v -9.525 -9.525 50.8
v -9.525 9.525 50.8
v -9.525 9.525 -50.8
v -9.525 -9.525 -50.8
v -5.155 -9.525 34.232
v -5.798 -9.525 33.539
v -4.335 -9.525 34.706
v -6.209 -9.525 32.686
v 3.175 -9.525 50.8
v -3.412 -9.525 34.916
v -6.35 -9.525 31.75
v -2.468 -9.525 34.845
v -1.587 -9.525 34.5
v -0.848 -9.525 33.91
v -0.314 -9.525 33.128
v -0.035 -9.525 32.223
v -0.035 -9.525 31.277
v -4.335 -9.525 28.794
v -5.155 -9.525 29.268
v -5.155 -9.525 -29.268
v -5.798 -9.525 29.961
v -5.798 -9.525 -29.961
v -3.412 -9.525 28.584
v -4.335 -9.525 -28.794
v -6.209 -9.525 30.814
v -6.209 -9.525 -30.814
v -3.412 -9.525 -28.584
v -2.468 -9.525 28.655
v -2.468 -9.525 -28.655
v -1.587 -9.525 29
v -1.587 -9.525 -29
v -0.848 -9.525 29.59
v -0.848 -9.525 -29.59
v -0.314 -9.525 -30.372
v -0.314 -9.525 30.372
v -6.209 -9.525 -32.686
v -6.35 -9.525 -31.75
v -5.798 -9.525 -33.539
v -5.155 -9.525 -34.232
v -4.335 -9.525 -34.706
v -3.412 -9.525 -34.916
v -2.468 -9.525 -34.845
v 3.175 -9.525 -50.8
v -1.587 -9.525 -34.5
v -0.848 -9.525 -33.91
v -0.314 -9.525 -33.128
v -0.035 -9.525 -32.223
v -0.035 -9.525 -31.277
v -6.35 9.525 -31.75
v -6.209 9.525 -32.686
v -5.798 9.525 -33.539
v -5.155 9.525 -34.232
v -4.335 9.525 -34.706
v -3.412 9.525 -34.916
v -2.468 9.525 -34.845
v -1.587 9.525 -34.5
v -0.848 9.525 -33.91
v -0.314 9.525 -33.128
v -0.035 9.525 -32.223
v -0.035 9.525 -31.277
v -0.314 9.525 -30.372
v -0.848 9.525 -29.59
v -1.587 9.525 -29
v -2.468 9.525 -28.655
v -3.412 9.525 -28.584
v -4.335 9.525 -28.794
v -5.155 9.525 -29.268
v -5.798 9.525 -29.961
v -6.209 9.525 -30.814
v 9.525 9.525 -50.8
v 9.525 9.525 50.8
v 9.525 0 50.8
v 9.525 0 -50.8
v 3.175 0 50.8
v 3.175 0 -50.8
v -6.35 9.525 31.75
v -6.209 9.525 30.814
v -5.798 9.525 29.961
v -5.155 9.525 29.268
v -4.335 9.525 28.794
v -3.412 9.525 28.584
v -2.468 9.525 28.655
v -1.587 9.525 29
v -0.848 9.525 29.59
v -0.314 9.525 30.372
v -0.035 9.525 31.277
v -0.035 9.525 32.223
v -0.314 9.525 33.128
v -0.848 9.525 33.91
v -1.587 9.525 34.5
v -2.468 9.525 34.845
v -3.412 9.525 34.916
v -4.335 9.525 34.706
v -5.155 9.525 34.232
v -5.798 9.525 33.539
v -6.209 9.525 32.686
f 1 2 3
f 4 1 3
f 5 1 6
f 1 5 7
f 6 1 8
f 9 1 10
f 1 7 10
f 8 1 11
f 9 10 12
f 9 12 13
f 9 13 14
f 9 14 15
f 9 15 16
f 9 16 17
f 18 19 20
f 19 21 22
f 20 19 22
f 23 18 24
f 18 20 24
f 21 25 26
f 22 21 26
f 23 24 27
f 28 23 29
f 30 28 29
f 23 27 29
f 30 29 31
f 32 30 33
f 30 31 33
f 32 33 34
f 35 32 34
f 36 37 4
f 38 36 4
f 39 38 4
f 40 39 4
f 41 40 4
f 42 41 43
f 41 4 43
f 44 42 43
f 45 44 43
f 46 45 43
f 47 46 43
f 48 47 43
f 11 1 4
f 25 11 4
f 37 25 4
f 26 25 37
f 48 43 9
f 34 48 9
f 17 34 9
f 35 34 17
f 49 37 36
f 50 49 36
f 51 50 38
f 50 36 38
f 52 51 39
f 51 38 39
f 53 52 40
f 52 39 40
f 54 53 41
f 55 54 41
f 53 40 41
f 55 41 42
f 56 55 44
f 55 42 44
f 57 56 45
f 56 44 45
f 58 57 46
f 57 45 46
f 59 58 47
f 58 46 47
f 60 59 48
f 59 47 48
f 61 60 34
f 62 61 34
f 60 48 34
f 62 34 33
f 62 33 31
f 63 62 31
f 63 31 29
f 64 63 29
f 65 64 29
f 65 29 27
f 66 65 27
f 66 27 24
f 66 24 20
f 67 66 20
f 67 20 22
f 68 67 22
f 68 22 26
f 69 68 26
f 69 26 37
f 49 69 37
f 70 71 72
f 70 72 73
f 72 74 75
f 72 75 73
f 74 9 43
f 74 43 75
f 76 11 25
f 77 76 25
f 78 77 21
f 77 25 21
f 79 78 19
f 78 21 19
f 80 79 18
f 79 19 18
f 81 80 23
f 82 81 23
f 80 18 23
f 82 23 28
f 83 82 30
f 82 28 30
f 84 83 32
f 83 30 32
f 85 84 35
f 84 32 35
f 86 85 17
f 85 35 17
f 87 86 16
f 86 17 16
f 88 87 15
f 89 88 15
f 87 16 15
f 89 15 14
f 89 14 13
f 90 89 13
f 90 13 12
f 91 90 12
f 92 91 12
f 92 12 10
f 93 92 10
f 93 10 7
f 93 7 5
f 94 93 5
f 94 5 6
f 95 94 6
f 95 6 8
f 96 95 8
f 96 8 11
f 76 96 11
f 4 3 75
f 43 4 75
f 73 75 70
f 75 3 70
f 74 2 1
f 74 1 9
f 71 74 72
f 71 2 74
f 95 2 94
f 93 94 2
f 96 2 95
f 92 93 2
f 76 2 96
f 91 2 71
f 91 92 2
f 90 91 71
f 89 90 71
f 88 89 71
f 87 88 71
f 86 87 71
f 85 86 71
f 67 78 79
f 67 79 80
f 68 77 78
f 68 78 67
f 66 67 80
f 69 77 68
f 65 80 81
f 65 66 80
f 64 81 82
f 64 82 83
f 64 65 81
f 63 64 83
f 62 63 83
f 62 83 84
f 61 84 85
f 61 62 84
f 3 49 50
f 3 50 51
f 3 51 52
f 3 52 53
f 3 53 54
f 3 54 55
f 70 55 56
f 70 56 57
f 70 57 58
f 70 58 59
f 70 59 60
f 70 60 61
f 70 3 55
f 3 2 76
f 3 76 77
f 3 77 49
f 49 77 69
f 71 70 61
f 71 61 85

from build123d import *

# Parameters (mm, degrees)
SKETCH1_W                       = 19.05
SKETCH1_H                       = 101.6
BOSS_EXTRUDE1_DEPTH             = 9.525
SKETCH2_W                       = 6.35
SKETCH2_H                       = 9.525
CUT_EXTRUDE1_DEPTH              = 103.489078686
F_1_4_0_25_DIAMETER_HOLE1_D     = 6.35
F_1_4_0_25_DIAMETER_HOLE1_DEPTH = 25.4
F_1_4_0_25_DIAMETER_HOLE1_TIP   = 1.907732465


with BuildPart() as part:
    # Sketch1 → Boss-Extrude1 (new, symmetric)
    with BuildSketch(Plane(origin=(0, 0, 0), x_dir=(1, 0, 0), z_dir=(0, 1, 0))):
        Rectangle(SKETCH1_W, SKETCH1_H)
    extrude(amount=BOSS_EXTRUDE1_DEPTH, both=True)

    # Sketch2 → Cut-Extrude1 (cut, through all)
    with BuildSketch(Plane.XY.offset(50.8)):
        with Locations((6.35, -4.7625)):
            Rectangle(SKETCH2_W, SKETCH2_H)
    extrude(amount=-CUT_EXTRUDE1_DEPTH, mode=Mode.SUBTRACT)

    # 1/4 (0.25) Diameter Hole1
    with Locations(Plane(origin=(0, 9.525, 0), x_dir=(1, 0, 0), z_dir=(0, 1, 0))):
        with Locations((-3.175, 31.75), (-3.175, -31.75)):
            Hole(F_1_4_0_25_DIAMETER_HOLE1_D / 2, depth=F_1_4_0_25_DIAMETER_HOLE1_DEPTH)
            with Locations((0, 0, -(F_1_4_0_25_DIAMETER_HOLE1_DEPTH + F_1_4_0_25_DIAMETER_HOLE1_TIP / 2))):  # 118° drill point
                Cone(0, F_1_4_0_25_DIAMETER_HOLE1_D / 2, F_1_4_0_25_DIAMETER_HOLE1_TIP, mode=Mode.SUBTRACT)


solid = part.part
